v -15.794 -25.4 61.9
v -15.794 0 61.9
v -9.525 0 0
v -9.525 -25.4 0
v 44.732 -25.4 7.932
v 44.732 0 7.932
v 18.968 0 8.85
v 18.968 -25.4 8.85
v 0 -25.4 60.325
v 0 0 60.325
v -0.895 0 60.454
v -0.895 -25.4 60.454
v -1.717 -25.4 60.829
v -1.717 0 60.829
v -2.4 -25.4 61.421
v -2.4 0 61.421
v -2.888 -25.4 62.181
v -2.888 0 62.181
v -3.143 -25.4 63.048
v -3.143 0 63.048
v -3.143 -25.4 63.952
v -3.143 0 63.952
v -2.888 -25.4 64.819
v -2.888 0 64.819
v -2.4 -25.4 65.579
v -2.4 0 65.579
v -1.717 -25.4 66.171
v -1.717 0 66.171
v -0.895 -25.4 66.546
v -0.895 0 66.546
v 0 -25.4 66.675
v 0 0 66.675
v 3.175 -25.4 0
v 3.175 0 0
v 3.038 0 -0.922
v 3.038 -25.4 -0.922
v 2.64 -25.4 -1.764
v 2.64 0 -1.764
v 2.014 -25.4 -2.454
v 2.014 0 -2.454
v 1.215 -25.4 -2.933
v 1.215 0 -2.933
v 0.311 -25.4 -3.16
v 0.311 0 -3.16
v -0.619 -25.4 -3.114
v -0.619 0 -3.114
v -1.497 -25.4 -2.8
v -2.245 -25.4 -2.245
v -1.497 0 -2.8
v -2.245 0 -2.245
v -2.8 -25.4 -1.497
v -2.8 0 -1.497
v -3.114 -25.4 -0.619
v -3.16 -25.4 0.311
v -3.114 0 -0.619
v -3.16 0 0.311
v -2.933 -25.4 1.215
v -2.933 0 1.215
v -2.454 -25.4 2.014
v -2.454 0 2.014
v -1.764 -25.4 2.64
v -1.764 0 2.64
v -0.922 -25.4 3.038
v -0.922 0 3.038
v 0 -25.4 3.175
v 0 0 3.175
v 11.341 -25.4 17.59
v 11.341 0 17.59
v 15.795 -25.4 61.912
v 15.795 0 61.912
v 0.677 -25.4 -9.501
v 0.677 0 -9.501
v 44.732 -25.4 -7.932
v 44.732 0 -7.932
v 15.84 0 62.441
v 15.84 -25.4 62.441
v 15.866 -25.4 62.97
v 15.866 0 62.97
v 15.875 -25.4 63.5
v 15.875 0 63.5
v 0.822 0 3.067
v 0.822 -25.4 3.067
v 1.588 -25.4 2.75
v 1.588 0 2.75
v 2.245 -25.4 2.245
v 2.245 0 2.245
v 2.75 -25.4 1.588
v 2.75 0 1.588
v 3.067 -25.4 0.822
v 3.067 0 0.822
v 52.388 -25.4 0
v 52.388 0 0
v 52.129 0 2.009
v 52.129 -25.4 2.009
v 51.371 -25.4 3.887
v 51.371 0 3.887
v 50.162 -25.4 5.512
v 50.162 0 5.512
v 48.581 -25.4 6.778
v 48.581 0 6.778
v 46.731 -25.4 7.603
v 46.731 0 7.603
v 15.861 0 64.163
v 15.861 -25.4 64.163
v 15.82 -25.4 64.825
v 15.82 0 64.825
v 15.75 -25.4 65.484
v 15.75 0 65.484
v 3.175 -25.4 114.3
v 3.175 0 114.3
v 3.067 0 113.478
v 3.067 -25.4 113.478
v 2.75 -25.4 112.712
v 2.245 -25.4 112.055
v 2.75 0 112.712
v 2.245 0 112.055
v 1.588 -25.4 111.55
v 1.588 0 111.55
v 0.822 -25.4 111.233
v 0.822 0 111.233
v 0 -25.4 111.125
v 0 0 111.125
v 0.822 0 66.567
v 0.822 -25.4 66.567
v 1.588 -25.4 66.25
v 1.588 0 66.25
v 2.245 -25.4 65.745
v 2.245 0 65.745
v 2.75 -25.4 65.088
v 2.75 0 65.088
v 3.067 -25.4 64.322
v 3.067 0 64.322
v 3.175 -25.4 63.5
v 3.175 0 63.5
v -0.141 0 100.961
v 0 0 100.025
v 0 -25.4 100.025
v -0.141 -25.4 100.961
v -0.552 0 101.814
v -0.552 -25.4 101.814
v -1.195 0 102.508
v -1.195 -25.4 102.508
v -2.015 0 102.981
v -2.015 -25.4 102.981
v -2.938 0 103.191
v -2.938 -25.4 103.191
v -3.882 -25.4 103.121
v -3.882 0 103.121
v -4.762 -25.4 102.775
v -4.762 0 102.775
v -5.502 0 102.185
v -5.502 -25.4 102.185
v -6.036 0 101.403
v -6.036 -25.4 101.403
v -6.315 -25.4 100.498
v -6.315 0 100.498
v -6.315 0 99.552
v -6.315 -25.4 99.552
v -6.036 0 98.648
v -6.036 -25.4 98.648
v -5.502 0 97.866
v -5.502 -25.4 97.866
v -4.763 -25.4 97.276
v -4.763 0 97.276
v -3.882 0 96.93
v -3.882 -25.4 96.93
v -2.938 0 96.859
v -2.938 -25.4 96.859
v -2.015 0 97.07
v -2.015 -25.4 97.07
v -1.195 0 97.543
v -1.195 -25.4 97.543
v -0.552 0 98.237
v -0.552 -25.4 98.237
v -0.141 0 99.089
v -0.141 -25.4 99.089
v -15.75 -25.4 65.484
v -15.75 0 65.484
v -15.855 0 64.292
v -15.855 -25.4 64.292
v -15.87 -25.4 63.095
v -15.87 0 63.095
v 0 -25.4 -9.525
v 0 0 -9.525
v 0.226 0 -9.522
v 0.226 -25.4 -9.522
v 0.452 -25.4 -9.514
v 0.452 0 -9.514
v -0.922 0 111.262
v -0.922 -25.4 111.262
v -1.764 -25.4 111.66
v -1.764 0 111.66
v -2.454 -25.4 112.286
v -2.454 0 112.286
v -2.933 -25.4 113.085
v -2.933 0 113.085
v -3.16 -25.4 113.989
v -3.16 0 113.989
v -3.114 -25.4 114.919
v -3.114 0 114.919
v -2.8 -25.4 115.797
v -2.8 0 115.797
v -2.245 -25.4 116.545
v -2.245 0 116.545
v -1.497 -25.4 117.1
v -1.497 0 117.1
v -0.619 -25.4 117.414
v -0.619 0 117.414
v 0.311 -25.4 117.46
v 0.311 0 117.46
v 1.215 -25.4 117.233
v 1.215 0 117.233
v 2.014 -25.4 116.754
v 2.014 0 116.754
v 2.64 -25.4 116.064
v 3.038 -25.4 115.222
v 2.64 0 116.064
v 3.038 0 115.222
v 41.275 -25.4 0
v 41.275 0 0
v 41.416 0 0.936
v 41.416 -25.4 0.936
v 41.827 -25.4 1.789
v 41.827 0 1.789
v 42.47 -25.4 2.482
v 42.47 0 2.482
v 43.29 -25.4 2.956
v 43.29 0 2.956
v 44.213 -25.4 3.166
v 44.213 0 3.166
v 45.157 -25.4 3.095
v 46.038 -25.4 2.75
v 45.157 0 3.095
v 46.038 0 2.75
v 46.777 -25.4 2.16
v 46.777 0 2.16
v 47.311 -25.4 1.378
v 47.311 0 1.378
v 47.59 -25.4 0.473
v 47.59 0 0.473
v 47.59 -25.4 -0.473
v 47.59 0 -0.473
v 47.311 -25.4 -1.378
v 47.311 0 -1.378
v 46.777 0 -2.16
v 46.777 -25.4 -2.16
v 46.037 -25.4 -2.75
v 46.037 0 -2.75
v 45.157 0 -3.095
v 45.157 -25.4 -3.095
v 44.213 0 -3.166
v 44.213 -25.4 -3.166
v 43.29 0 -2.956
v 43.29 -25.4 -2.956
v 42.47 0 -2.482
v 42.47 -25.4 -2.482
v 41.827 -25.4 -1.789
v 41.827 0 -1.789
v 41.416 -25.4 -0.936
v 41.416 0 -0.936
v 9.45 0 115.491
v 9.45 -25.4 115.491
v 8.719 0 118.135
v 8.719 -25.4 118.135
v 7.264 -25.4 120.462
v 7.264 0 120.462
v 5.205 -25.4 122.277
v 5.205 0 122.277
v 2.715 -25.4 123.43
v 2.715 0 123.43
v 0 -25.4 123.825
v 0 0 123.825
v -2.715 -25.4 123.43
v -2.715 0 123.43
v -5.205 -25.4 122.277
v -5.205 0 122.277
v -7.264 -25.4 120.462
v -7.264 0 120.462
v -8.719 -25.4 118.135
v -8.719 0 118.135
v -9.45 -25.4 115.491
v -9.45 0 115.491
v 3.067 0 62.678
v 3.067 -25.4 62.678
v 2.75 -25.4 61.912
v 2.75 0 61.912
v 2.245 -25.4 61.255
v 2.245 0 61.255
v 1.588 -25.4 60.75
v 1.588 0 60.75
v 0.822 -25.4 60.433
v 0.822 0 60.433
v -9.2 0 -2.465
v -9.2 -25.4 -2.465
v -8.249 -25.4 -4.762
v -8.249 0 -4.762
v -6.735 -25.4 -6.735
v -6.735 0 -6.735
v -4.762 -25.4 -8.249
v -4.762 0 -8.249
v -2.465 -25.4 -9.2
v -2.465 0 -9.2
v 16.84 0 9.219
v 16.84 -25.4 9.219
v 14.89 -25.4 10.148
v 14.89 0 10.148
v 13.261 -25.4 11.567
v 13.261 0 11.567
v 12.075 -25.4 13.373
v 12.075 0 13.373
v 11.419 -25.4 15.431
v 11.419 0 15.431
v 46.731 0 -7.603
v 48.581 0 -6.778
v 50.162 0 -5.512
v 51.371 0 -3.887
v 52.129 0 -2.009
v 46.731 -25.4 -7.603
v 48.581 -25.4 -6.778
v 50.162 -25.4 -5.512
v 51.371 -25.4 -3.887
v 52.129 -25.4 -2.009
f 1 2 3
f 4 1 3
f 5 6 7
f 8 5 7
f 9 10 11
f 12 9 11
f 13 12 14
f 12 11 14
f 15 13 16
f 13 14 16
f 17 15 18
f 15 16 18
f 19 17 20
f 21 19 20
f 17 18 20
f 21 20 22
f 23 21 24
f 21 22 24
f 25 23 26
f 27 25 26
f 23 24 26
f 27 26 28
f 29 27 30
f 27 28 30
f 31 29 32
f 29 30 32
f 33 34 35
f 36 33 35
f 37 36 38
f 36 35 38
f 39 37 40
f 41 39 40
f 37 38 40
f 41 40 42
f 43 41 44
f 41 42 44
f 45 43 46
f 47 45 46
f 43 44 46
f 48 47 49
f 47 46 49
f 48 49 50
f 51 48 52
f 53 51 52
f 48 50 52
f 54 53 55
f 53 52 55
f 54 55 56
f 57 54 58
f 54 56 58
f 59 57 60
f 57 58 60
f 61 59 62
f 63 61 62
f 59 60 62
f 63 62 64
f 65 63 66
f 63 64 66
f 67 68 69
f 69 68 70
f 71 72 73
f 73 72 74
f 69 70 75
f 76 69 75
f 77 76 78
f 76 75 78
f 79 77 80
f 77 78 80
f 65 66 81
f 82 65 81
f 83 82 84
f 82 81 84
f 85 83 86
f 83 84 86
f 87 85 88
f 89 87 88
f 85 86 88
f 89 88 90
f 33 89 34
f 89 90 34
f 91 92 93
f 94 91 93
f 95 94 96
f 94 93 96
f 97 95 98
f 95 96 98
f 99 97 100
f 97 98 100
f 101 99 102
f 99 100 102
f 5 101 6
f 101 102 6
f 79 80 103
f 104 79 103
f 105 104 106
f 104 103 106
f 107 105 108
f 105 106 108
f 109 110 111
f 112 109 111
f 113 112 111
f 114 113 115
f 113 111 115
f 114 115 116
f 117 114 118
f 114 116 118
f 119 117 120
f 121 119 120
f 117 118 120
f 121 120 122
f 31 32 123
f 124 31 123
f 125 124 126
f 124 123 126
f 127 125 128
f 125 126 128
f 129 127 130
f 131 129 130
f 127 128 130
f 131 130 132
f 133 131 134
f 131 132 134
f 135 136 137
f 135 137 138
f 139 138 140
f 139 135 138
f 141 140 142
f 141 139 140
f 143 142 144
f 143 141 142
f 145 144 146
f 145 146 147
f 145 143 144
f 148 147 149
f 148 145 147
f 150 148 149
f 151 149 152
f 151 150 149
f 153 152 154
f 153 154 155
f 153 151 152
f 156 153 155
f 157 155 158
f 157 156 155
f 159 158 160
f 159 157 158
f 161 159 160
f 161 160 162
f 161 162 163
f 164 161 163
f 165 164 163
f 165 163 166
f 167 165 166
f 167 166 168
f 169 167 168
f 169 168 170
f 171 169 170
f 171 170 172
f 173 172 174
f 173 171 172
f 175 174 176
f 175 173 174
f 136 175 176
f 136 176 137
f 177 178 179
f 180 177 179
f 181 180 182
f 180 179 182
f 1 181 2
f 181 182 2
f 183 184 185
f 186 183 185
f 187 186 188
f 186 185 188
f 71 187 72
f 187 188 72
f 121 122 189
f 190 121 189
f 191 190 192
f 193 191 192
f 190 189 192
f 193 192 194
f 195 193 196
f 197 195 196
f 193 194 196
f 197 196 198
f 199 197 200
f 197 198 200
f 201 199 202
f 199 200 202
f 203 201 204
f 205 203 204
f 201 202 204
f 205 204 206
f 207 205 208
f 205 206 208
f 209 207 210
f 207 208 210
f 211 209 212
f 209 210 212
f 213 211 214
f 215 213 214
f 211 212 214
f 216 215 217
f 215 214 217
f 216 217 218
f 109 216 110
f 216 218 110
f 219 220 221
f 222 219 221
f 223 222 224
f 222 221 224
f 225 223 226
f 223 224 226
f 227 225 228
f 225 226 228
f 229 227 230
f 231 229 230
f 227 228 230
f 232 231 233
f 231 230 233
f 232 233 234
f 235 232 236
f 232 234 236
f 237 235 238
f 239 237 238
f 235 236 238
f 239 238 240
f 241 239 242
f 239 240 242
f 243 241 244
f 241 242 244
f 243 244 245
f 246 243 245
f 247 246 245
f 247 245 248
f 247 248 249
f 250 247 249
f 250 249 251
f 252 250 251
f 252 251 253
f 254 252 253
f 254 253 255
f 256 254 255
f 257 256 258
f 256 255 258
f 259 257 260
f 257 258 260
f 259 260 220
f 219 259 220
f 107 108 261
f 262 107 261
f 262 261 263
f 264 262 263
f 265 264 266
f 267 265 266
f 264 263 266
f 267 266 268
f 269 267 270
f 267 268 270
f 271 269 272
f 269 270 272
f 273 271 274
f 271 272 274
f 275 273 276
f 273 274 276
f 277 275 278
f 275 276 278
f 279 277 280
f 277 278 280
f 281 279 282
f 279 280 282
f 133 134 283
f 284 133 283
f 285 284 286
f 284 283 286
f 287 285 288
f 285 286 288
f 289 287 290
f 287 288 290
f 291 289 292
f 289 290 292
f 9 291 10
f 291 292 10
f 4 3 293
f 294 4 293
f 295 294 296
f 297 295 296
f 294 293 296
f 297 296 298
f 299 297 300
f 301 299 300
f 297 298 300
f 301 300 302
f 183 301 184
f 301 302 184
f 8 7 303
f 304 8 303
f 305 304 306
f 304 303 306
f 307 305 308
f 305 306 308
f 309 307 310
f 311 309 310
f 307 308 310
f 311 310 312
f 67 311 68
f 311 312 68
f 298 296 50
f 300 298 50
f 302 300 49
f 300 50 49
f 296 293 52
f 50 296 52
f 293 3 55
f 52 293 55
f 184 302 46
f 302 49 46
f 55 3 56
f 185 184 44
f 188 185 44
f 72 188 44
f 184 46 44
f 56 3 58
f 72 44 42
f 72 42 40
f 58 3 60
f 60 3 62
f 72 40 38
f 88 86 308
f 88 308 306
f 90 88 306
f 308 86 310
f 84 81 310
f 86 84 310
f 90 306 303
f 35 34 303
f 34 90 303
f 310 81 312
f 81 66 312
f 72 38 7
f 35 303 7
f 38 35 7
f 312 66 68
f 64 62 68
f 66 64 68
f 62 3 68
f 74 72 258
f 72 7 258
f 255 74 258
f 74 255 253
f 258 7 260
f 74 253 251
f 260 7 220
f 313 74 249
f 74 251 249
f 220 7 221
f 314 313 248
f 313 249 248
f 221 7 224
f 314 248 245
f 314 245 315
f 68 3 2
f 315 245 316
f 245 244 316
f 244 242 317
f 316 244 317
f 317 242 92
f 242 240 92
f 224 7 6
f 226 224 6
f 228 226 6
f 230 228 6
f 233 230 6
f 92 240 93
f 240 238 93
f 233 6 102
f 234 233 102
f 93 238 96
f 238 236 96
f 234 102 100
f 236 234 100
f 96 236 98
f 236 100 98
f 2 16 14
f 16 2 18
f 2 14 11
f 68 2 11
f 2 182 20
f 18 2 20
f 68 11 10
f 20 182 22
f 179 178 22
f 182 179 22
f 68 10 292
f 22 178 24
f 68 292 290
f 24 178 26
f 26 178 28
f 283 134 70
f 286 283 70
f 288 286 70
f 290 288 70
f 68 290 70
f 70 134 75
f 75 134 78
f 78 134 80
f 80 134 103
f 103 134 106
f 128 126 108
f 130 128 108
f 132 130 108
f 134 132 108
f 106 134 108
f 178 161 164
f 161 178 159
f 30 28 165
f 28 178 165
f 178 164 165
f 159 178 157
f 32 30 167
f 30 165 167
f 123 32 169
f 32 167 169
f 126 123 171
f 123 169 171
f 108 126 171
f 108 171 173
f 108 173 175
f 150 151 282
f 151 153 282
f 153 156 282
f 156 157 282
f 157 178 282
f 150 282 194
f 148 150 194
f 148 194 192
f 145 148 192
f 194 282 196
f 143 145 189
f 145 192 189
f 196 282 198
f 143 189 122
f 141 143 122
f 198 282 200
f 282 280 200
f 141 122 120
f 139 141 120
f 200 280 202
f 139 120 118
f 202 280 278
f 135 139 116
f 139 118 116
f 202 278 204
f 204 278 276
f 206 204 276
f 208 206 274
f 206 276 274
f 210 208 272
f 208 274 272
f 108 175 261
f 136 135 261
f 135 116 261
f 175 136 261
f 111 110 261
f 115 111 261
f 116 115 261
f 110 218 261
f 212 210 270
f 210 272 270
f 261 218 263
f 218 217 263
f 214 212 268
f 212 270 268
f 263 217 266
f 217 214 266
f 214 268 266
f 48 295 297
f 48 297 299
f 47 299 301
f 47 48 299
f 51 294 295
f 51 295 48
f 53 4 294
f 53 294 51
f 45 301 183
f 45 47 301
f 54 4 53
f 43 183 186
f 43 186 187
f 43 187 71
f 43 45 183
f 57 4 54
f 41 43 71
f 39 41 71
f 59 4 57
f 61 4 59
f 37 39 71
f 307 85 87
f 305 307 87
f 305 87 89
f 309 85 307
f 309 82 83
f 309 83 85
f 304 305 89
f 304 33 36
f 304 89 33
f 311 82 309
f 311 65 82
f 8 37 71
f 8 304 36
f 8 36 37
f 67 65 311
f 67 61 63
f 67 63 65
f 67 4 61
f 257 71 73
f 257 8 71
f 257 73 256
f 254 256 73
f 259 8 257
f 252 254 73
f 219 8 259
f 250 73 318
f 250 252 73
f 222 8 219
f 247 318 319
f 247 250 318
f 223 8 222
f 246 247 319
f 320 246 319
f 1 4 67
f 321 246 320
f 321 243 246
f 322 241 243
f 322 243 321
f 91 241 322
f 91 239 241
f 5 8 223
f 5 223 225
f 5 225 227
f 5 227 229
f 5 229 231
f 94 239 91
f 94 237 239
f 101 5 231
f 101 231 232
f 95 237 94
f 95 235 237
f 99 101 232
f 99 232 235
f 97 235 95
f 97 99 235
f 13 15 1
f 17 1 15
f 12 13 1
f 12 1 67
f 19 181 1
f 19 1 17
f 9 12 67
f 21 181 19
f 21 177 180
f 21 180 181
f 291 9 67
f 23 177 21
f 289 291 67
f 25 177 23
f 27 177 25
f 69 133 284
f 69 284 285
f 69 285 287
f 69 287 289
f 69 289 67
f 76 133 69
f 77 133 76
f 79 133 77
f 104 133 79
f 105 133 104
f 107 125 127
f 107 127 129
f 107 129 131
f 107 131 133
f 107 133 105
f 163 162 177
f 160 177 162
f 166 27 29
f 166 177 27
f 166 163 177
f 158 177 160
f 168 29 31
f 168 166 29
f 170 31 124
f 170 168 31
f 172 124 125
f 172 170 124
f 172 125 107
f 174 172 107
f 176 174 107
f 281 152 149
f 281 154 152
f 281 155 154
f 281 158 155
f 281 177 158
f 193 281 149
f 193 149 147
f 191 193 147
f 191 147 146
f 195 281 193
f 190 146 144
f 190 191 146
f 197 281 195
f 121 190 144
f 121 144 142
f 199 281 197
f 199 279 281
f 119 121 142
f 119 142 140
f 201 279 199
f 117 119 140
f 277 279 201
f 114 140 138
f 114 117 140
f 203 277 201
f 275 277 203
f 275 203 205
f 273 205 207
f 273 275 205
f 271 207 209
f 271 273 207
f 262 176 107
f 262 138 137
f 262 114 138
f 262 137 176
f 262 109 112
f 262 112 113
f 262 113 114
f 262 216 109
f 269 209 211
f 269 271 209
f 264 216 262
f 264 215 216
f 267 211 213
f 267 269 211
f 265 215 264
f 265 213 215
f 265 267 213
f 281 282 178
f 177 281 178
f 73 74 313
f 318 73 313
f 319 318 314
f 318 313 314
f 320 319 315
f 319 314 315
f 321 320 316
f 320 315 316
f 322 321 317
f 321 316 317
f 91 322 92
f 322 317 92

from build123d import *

# Parameters (mm, degrees)
F0_R     = 3.175
F1_DEPTH = 25.4


with BuildPart() as f1:
    # F0 (on Front) → F1 (new body)
    with BuildSketch(Plane.XZ):
        with BuildLine():
            Line((0.6773435479, -9.500885786), (0, -9.525))
            ThreePointArc((0, -9.525), (0.3388863295, -9.5189695375), (0.6773435479, -9.500885786))
        make_face()
        with BuildLine():
            Line((-15.7942028036, 61.9003804205), (-9.525, 0))
            ThreePointArc((-9.525, 0), (-6.7351920908, 6.7351920908), (0, 9.525))
            Line((0, 9.525), (0, 47.625))
            ThreePointArc((0, 47.625), (-10.644756084, 51.722700101), (-15.7942028036, 61.9003804205))
        make_face()
        with BuildLine():
            ThreePointArc((9.525, 0), (6.9705567315, -6.4912990883), (0.6773435479, -9.500885786))
            Line((0.6773435479, -9.500885786), (44.7324052746, -7.9324746146))
            ThreePointArc((44.7324052746, -7.9324746146), (38.9380895153, -5.7116327839), (36.5125, 0))
            Line((36.5125, 0), (9.525, 0))
        make_face()
        with BuildLine():
            Line((0, 100.0252), (0, 79.375))
            ThreePointArc((0, 79.375), (10.5003255158, 75.40625), (15.7504882737, 65.484375))
            Line((15.7504882737, 65.484375), (9.4502929642, 115.490625))
            ThreePointArc((9.4502929642, 115.490625), (9.5063048942, 114.896483242), (9.525, 114.3))
            ThreePointArc((9.525, 114.3), (6.7351920908, 107.5648079092), (0, 104.775))
            Line((0, 104.775), (0, 100.0252))
        make_face()
        with BuildLine():
            ThreePointArc((36.5125, 0), (38.9380895153, -5.7116327839), (44.7324052746, -7.9324746146))
            ThreePointArc((44.7324052746, -7.9324746146), (50.1616327839, -5.5119104847), (52.3875, 0))
            ThreePointArc((52.3875, 0), (50.1616327839, 5.5119104847), (44.7324052746, 7.9324746146))
            ThreePointArc((44.7324052746, 7.9324746146), (38.9380895153, 5.7116327839), (36.5125, 0))
        make_face()
        with BuildLine():
            ThreePointArc((47.625, 0), (44.45, -3.175), (41.275, 0))
            ThreePointArc((41.275, 0), (44.45, 3.175), (47.625, 0))
        make_face(mode=Mode.SUBTRACT)
        with BuildLine():
            ThreePointArc((9.4502929642, 115.490625), (0, 123.825), (-9.4502929642, 115.490625))
            ThreePointArc((-9.4502929642, 115.490625), (-7.14375, 107.9998046905), (0, 104.775))
            ThreePointArc((0, 104.775), (6.7351920908, 107.5648079092), (9.525, 114.3))
            ThreePointArc((9.525, 114.3), (9.5063048942, 114.896483242), (9.4502929642, 115.490625))
        make_face()
        with BuildLine():
            ThreePointArc((3.175, 114.3), (2.2450640303, 112.0549359697), (0, 111.125))
            ThreePointArc((0, 111.125), (-2.2450640303, 116.5450640303), (3.175, 114.3))
        make_face(mode=Mode.SUBTRACT)
        with BuildLine():
            Line((0, 60.325), (0, 47.625))
            ThreePointArc((0, 47.625), (10.6492737428, 51.7267849017), (15.7954255641, 61.9125))
            ThreePointArc((15.7954255641, 61.9125), (15.8550939106, 62.7052534459), (15.875, 63.5))
            ThreePointArc((15.875, 63.5), (15.8438414904, 64.4941387366), (15.7504882737, 65.484375))
            ThreePointArc((15.7504882737, 65.484375), (10.5003255158, 75.40625), (0, 79.375))
            Line((0, 79.375), (0, 66.675))
            ThreePointArc((0, 66.675), (2.2450640303, 65.7450640303), (3.175, 63.5))
            ThreePointArc((3.175, 63.5), (2.2450640303, 61.2549359697), (0, 60.325))
        make_face()
        with BuildLine():
            ThreePointArc((-15.7504882737, 65.484375), (-15.8738192656, 63.6936154008), (-15.7942028036, 61.9003804205))
            ThreePointArc((-15.7942028036, 61.9003804205), (-10.644756084, 51.722700101), (0, 47.625))
            Line((0, 47.625), (0, 60.325))
            ThreePointArc((0, 60.325), (-3.175, 63.5), (0, 66.675))
            Line((0, 66.675), (0, 79.375))
            ThreePointArc((0, 79.375), (-10.5003255158, 75.40625), (-15.7504882737, 65.484375))
        make_face()
        with BuildLine():
            Line((0, 47.625), (0, 9.525))
            ThreePointArc((0, 9.525), (6.7351920908, 6.7351920908), (9.525, 0))
            Line((9.525, 0), (36.5125, 0))
            ThreePointArc((36.5125, 0), (38.9380895153, 5.7116327839), (44.7324052746, 7.9324746146))
            Line((44.7324052746, 7.9324746146), (18.968327868, 8.8497055806))
            ThreePointArc((18.968327868, 8.8497055806), (13.2612039825, 11.5674628959), (11.3408358685, 17.5898921545))
            Line((11.3408358685, 17.5898921545), (15.7954255641, 61.9125))
            ThreePointArc((15.7954255641, 61.9125), (10.6492737428, 51.7267849017), (0, 47.625))
        make_face()
        with BuildLine():
            ThreePointArc((0, 9.525), (-6.7351920908, 6.7351920908), (-9.525, 0))
            ThreePointArc((-9.525, 0), (-6.7351920908, -6.7351920908), (0, -9.525))
            Line((0, -9.525), (0.6773435479, -9.500885786))
            ThreePointArc((0.6773435479, -9.500885786), (6.9705567315, -6.4912990883), (9.525, 0))
            Line((9.525, 0), (3.175, 0))
            ThreePointArc((3.175, 0), (-2.2450640303, -2.2450640303), (0, 3.175))
            Line((0, 3.175), (0, 9.525))
        make_face()
        with BuildLine():
            ThreePointArc((9.525, 0), (6.7351920908, 6.7351920908), (0, 9.525))
            Line((0, 9.525), (0, 3.175))
            ThreePointArc((0, 3.175), (2.2450640303, 2.2450640303), (3.175, 0))
            Line((3.175, 0), (9.525, 0))
        make_face()
        with BuildLine():
            Line((-9.4502929642, 115.490625), (-15.7504882737, 65.484375))
            ThreePointArc((-15.7504882737, 65.484375), (-10.5003255158, 75.40625), (0, 79.375))
            Line((0, 79.375), (0, 100.0252))
            Line((0, 100.0252), (0, 104.775))
            ThreePointArc((0, 104.775), (-7.14375, 107.9998046905), (-9.4502929642, 115.490625))
        make_face()
        with Locations((-3.175, 100.0252)):
            Circle(F0_R, mode=Mode.SUBTRACT)
    extrude(amount=F1_DEPTH)


solid = f1.part
